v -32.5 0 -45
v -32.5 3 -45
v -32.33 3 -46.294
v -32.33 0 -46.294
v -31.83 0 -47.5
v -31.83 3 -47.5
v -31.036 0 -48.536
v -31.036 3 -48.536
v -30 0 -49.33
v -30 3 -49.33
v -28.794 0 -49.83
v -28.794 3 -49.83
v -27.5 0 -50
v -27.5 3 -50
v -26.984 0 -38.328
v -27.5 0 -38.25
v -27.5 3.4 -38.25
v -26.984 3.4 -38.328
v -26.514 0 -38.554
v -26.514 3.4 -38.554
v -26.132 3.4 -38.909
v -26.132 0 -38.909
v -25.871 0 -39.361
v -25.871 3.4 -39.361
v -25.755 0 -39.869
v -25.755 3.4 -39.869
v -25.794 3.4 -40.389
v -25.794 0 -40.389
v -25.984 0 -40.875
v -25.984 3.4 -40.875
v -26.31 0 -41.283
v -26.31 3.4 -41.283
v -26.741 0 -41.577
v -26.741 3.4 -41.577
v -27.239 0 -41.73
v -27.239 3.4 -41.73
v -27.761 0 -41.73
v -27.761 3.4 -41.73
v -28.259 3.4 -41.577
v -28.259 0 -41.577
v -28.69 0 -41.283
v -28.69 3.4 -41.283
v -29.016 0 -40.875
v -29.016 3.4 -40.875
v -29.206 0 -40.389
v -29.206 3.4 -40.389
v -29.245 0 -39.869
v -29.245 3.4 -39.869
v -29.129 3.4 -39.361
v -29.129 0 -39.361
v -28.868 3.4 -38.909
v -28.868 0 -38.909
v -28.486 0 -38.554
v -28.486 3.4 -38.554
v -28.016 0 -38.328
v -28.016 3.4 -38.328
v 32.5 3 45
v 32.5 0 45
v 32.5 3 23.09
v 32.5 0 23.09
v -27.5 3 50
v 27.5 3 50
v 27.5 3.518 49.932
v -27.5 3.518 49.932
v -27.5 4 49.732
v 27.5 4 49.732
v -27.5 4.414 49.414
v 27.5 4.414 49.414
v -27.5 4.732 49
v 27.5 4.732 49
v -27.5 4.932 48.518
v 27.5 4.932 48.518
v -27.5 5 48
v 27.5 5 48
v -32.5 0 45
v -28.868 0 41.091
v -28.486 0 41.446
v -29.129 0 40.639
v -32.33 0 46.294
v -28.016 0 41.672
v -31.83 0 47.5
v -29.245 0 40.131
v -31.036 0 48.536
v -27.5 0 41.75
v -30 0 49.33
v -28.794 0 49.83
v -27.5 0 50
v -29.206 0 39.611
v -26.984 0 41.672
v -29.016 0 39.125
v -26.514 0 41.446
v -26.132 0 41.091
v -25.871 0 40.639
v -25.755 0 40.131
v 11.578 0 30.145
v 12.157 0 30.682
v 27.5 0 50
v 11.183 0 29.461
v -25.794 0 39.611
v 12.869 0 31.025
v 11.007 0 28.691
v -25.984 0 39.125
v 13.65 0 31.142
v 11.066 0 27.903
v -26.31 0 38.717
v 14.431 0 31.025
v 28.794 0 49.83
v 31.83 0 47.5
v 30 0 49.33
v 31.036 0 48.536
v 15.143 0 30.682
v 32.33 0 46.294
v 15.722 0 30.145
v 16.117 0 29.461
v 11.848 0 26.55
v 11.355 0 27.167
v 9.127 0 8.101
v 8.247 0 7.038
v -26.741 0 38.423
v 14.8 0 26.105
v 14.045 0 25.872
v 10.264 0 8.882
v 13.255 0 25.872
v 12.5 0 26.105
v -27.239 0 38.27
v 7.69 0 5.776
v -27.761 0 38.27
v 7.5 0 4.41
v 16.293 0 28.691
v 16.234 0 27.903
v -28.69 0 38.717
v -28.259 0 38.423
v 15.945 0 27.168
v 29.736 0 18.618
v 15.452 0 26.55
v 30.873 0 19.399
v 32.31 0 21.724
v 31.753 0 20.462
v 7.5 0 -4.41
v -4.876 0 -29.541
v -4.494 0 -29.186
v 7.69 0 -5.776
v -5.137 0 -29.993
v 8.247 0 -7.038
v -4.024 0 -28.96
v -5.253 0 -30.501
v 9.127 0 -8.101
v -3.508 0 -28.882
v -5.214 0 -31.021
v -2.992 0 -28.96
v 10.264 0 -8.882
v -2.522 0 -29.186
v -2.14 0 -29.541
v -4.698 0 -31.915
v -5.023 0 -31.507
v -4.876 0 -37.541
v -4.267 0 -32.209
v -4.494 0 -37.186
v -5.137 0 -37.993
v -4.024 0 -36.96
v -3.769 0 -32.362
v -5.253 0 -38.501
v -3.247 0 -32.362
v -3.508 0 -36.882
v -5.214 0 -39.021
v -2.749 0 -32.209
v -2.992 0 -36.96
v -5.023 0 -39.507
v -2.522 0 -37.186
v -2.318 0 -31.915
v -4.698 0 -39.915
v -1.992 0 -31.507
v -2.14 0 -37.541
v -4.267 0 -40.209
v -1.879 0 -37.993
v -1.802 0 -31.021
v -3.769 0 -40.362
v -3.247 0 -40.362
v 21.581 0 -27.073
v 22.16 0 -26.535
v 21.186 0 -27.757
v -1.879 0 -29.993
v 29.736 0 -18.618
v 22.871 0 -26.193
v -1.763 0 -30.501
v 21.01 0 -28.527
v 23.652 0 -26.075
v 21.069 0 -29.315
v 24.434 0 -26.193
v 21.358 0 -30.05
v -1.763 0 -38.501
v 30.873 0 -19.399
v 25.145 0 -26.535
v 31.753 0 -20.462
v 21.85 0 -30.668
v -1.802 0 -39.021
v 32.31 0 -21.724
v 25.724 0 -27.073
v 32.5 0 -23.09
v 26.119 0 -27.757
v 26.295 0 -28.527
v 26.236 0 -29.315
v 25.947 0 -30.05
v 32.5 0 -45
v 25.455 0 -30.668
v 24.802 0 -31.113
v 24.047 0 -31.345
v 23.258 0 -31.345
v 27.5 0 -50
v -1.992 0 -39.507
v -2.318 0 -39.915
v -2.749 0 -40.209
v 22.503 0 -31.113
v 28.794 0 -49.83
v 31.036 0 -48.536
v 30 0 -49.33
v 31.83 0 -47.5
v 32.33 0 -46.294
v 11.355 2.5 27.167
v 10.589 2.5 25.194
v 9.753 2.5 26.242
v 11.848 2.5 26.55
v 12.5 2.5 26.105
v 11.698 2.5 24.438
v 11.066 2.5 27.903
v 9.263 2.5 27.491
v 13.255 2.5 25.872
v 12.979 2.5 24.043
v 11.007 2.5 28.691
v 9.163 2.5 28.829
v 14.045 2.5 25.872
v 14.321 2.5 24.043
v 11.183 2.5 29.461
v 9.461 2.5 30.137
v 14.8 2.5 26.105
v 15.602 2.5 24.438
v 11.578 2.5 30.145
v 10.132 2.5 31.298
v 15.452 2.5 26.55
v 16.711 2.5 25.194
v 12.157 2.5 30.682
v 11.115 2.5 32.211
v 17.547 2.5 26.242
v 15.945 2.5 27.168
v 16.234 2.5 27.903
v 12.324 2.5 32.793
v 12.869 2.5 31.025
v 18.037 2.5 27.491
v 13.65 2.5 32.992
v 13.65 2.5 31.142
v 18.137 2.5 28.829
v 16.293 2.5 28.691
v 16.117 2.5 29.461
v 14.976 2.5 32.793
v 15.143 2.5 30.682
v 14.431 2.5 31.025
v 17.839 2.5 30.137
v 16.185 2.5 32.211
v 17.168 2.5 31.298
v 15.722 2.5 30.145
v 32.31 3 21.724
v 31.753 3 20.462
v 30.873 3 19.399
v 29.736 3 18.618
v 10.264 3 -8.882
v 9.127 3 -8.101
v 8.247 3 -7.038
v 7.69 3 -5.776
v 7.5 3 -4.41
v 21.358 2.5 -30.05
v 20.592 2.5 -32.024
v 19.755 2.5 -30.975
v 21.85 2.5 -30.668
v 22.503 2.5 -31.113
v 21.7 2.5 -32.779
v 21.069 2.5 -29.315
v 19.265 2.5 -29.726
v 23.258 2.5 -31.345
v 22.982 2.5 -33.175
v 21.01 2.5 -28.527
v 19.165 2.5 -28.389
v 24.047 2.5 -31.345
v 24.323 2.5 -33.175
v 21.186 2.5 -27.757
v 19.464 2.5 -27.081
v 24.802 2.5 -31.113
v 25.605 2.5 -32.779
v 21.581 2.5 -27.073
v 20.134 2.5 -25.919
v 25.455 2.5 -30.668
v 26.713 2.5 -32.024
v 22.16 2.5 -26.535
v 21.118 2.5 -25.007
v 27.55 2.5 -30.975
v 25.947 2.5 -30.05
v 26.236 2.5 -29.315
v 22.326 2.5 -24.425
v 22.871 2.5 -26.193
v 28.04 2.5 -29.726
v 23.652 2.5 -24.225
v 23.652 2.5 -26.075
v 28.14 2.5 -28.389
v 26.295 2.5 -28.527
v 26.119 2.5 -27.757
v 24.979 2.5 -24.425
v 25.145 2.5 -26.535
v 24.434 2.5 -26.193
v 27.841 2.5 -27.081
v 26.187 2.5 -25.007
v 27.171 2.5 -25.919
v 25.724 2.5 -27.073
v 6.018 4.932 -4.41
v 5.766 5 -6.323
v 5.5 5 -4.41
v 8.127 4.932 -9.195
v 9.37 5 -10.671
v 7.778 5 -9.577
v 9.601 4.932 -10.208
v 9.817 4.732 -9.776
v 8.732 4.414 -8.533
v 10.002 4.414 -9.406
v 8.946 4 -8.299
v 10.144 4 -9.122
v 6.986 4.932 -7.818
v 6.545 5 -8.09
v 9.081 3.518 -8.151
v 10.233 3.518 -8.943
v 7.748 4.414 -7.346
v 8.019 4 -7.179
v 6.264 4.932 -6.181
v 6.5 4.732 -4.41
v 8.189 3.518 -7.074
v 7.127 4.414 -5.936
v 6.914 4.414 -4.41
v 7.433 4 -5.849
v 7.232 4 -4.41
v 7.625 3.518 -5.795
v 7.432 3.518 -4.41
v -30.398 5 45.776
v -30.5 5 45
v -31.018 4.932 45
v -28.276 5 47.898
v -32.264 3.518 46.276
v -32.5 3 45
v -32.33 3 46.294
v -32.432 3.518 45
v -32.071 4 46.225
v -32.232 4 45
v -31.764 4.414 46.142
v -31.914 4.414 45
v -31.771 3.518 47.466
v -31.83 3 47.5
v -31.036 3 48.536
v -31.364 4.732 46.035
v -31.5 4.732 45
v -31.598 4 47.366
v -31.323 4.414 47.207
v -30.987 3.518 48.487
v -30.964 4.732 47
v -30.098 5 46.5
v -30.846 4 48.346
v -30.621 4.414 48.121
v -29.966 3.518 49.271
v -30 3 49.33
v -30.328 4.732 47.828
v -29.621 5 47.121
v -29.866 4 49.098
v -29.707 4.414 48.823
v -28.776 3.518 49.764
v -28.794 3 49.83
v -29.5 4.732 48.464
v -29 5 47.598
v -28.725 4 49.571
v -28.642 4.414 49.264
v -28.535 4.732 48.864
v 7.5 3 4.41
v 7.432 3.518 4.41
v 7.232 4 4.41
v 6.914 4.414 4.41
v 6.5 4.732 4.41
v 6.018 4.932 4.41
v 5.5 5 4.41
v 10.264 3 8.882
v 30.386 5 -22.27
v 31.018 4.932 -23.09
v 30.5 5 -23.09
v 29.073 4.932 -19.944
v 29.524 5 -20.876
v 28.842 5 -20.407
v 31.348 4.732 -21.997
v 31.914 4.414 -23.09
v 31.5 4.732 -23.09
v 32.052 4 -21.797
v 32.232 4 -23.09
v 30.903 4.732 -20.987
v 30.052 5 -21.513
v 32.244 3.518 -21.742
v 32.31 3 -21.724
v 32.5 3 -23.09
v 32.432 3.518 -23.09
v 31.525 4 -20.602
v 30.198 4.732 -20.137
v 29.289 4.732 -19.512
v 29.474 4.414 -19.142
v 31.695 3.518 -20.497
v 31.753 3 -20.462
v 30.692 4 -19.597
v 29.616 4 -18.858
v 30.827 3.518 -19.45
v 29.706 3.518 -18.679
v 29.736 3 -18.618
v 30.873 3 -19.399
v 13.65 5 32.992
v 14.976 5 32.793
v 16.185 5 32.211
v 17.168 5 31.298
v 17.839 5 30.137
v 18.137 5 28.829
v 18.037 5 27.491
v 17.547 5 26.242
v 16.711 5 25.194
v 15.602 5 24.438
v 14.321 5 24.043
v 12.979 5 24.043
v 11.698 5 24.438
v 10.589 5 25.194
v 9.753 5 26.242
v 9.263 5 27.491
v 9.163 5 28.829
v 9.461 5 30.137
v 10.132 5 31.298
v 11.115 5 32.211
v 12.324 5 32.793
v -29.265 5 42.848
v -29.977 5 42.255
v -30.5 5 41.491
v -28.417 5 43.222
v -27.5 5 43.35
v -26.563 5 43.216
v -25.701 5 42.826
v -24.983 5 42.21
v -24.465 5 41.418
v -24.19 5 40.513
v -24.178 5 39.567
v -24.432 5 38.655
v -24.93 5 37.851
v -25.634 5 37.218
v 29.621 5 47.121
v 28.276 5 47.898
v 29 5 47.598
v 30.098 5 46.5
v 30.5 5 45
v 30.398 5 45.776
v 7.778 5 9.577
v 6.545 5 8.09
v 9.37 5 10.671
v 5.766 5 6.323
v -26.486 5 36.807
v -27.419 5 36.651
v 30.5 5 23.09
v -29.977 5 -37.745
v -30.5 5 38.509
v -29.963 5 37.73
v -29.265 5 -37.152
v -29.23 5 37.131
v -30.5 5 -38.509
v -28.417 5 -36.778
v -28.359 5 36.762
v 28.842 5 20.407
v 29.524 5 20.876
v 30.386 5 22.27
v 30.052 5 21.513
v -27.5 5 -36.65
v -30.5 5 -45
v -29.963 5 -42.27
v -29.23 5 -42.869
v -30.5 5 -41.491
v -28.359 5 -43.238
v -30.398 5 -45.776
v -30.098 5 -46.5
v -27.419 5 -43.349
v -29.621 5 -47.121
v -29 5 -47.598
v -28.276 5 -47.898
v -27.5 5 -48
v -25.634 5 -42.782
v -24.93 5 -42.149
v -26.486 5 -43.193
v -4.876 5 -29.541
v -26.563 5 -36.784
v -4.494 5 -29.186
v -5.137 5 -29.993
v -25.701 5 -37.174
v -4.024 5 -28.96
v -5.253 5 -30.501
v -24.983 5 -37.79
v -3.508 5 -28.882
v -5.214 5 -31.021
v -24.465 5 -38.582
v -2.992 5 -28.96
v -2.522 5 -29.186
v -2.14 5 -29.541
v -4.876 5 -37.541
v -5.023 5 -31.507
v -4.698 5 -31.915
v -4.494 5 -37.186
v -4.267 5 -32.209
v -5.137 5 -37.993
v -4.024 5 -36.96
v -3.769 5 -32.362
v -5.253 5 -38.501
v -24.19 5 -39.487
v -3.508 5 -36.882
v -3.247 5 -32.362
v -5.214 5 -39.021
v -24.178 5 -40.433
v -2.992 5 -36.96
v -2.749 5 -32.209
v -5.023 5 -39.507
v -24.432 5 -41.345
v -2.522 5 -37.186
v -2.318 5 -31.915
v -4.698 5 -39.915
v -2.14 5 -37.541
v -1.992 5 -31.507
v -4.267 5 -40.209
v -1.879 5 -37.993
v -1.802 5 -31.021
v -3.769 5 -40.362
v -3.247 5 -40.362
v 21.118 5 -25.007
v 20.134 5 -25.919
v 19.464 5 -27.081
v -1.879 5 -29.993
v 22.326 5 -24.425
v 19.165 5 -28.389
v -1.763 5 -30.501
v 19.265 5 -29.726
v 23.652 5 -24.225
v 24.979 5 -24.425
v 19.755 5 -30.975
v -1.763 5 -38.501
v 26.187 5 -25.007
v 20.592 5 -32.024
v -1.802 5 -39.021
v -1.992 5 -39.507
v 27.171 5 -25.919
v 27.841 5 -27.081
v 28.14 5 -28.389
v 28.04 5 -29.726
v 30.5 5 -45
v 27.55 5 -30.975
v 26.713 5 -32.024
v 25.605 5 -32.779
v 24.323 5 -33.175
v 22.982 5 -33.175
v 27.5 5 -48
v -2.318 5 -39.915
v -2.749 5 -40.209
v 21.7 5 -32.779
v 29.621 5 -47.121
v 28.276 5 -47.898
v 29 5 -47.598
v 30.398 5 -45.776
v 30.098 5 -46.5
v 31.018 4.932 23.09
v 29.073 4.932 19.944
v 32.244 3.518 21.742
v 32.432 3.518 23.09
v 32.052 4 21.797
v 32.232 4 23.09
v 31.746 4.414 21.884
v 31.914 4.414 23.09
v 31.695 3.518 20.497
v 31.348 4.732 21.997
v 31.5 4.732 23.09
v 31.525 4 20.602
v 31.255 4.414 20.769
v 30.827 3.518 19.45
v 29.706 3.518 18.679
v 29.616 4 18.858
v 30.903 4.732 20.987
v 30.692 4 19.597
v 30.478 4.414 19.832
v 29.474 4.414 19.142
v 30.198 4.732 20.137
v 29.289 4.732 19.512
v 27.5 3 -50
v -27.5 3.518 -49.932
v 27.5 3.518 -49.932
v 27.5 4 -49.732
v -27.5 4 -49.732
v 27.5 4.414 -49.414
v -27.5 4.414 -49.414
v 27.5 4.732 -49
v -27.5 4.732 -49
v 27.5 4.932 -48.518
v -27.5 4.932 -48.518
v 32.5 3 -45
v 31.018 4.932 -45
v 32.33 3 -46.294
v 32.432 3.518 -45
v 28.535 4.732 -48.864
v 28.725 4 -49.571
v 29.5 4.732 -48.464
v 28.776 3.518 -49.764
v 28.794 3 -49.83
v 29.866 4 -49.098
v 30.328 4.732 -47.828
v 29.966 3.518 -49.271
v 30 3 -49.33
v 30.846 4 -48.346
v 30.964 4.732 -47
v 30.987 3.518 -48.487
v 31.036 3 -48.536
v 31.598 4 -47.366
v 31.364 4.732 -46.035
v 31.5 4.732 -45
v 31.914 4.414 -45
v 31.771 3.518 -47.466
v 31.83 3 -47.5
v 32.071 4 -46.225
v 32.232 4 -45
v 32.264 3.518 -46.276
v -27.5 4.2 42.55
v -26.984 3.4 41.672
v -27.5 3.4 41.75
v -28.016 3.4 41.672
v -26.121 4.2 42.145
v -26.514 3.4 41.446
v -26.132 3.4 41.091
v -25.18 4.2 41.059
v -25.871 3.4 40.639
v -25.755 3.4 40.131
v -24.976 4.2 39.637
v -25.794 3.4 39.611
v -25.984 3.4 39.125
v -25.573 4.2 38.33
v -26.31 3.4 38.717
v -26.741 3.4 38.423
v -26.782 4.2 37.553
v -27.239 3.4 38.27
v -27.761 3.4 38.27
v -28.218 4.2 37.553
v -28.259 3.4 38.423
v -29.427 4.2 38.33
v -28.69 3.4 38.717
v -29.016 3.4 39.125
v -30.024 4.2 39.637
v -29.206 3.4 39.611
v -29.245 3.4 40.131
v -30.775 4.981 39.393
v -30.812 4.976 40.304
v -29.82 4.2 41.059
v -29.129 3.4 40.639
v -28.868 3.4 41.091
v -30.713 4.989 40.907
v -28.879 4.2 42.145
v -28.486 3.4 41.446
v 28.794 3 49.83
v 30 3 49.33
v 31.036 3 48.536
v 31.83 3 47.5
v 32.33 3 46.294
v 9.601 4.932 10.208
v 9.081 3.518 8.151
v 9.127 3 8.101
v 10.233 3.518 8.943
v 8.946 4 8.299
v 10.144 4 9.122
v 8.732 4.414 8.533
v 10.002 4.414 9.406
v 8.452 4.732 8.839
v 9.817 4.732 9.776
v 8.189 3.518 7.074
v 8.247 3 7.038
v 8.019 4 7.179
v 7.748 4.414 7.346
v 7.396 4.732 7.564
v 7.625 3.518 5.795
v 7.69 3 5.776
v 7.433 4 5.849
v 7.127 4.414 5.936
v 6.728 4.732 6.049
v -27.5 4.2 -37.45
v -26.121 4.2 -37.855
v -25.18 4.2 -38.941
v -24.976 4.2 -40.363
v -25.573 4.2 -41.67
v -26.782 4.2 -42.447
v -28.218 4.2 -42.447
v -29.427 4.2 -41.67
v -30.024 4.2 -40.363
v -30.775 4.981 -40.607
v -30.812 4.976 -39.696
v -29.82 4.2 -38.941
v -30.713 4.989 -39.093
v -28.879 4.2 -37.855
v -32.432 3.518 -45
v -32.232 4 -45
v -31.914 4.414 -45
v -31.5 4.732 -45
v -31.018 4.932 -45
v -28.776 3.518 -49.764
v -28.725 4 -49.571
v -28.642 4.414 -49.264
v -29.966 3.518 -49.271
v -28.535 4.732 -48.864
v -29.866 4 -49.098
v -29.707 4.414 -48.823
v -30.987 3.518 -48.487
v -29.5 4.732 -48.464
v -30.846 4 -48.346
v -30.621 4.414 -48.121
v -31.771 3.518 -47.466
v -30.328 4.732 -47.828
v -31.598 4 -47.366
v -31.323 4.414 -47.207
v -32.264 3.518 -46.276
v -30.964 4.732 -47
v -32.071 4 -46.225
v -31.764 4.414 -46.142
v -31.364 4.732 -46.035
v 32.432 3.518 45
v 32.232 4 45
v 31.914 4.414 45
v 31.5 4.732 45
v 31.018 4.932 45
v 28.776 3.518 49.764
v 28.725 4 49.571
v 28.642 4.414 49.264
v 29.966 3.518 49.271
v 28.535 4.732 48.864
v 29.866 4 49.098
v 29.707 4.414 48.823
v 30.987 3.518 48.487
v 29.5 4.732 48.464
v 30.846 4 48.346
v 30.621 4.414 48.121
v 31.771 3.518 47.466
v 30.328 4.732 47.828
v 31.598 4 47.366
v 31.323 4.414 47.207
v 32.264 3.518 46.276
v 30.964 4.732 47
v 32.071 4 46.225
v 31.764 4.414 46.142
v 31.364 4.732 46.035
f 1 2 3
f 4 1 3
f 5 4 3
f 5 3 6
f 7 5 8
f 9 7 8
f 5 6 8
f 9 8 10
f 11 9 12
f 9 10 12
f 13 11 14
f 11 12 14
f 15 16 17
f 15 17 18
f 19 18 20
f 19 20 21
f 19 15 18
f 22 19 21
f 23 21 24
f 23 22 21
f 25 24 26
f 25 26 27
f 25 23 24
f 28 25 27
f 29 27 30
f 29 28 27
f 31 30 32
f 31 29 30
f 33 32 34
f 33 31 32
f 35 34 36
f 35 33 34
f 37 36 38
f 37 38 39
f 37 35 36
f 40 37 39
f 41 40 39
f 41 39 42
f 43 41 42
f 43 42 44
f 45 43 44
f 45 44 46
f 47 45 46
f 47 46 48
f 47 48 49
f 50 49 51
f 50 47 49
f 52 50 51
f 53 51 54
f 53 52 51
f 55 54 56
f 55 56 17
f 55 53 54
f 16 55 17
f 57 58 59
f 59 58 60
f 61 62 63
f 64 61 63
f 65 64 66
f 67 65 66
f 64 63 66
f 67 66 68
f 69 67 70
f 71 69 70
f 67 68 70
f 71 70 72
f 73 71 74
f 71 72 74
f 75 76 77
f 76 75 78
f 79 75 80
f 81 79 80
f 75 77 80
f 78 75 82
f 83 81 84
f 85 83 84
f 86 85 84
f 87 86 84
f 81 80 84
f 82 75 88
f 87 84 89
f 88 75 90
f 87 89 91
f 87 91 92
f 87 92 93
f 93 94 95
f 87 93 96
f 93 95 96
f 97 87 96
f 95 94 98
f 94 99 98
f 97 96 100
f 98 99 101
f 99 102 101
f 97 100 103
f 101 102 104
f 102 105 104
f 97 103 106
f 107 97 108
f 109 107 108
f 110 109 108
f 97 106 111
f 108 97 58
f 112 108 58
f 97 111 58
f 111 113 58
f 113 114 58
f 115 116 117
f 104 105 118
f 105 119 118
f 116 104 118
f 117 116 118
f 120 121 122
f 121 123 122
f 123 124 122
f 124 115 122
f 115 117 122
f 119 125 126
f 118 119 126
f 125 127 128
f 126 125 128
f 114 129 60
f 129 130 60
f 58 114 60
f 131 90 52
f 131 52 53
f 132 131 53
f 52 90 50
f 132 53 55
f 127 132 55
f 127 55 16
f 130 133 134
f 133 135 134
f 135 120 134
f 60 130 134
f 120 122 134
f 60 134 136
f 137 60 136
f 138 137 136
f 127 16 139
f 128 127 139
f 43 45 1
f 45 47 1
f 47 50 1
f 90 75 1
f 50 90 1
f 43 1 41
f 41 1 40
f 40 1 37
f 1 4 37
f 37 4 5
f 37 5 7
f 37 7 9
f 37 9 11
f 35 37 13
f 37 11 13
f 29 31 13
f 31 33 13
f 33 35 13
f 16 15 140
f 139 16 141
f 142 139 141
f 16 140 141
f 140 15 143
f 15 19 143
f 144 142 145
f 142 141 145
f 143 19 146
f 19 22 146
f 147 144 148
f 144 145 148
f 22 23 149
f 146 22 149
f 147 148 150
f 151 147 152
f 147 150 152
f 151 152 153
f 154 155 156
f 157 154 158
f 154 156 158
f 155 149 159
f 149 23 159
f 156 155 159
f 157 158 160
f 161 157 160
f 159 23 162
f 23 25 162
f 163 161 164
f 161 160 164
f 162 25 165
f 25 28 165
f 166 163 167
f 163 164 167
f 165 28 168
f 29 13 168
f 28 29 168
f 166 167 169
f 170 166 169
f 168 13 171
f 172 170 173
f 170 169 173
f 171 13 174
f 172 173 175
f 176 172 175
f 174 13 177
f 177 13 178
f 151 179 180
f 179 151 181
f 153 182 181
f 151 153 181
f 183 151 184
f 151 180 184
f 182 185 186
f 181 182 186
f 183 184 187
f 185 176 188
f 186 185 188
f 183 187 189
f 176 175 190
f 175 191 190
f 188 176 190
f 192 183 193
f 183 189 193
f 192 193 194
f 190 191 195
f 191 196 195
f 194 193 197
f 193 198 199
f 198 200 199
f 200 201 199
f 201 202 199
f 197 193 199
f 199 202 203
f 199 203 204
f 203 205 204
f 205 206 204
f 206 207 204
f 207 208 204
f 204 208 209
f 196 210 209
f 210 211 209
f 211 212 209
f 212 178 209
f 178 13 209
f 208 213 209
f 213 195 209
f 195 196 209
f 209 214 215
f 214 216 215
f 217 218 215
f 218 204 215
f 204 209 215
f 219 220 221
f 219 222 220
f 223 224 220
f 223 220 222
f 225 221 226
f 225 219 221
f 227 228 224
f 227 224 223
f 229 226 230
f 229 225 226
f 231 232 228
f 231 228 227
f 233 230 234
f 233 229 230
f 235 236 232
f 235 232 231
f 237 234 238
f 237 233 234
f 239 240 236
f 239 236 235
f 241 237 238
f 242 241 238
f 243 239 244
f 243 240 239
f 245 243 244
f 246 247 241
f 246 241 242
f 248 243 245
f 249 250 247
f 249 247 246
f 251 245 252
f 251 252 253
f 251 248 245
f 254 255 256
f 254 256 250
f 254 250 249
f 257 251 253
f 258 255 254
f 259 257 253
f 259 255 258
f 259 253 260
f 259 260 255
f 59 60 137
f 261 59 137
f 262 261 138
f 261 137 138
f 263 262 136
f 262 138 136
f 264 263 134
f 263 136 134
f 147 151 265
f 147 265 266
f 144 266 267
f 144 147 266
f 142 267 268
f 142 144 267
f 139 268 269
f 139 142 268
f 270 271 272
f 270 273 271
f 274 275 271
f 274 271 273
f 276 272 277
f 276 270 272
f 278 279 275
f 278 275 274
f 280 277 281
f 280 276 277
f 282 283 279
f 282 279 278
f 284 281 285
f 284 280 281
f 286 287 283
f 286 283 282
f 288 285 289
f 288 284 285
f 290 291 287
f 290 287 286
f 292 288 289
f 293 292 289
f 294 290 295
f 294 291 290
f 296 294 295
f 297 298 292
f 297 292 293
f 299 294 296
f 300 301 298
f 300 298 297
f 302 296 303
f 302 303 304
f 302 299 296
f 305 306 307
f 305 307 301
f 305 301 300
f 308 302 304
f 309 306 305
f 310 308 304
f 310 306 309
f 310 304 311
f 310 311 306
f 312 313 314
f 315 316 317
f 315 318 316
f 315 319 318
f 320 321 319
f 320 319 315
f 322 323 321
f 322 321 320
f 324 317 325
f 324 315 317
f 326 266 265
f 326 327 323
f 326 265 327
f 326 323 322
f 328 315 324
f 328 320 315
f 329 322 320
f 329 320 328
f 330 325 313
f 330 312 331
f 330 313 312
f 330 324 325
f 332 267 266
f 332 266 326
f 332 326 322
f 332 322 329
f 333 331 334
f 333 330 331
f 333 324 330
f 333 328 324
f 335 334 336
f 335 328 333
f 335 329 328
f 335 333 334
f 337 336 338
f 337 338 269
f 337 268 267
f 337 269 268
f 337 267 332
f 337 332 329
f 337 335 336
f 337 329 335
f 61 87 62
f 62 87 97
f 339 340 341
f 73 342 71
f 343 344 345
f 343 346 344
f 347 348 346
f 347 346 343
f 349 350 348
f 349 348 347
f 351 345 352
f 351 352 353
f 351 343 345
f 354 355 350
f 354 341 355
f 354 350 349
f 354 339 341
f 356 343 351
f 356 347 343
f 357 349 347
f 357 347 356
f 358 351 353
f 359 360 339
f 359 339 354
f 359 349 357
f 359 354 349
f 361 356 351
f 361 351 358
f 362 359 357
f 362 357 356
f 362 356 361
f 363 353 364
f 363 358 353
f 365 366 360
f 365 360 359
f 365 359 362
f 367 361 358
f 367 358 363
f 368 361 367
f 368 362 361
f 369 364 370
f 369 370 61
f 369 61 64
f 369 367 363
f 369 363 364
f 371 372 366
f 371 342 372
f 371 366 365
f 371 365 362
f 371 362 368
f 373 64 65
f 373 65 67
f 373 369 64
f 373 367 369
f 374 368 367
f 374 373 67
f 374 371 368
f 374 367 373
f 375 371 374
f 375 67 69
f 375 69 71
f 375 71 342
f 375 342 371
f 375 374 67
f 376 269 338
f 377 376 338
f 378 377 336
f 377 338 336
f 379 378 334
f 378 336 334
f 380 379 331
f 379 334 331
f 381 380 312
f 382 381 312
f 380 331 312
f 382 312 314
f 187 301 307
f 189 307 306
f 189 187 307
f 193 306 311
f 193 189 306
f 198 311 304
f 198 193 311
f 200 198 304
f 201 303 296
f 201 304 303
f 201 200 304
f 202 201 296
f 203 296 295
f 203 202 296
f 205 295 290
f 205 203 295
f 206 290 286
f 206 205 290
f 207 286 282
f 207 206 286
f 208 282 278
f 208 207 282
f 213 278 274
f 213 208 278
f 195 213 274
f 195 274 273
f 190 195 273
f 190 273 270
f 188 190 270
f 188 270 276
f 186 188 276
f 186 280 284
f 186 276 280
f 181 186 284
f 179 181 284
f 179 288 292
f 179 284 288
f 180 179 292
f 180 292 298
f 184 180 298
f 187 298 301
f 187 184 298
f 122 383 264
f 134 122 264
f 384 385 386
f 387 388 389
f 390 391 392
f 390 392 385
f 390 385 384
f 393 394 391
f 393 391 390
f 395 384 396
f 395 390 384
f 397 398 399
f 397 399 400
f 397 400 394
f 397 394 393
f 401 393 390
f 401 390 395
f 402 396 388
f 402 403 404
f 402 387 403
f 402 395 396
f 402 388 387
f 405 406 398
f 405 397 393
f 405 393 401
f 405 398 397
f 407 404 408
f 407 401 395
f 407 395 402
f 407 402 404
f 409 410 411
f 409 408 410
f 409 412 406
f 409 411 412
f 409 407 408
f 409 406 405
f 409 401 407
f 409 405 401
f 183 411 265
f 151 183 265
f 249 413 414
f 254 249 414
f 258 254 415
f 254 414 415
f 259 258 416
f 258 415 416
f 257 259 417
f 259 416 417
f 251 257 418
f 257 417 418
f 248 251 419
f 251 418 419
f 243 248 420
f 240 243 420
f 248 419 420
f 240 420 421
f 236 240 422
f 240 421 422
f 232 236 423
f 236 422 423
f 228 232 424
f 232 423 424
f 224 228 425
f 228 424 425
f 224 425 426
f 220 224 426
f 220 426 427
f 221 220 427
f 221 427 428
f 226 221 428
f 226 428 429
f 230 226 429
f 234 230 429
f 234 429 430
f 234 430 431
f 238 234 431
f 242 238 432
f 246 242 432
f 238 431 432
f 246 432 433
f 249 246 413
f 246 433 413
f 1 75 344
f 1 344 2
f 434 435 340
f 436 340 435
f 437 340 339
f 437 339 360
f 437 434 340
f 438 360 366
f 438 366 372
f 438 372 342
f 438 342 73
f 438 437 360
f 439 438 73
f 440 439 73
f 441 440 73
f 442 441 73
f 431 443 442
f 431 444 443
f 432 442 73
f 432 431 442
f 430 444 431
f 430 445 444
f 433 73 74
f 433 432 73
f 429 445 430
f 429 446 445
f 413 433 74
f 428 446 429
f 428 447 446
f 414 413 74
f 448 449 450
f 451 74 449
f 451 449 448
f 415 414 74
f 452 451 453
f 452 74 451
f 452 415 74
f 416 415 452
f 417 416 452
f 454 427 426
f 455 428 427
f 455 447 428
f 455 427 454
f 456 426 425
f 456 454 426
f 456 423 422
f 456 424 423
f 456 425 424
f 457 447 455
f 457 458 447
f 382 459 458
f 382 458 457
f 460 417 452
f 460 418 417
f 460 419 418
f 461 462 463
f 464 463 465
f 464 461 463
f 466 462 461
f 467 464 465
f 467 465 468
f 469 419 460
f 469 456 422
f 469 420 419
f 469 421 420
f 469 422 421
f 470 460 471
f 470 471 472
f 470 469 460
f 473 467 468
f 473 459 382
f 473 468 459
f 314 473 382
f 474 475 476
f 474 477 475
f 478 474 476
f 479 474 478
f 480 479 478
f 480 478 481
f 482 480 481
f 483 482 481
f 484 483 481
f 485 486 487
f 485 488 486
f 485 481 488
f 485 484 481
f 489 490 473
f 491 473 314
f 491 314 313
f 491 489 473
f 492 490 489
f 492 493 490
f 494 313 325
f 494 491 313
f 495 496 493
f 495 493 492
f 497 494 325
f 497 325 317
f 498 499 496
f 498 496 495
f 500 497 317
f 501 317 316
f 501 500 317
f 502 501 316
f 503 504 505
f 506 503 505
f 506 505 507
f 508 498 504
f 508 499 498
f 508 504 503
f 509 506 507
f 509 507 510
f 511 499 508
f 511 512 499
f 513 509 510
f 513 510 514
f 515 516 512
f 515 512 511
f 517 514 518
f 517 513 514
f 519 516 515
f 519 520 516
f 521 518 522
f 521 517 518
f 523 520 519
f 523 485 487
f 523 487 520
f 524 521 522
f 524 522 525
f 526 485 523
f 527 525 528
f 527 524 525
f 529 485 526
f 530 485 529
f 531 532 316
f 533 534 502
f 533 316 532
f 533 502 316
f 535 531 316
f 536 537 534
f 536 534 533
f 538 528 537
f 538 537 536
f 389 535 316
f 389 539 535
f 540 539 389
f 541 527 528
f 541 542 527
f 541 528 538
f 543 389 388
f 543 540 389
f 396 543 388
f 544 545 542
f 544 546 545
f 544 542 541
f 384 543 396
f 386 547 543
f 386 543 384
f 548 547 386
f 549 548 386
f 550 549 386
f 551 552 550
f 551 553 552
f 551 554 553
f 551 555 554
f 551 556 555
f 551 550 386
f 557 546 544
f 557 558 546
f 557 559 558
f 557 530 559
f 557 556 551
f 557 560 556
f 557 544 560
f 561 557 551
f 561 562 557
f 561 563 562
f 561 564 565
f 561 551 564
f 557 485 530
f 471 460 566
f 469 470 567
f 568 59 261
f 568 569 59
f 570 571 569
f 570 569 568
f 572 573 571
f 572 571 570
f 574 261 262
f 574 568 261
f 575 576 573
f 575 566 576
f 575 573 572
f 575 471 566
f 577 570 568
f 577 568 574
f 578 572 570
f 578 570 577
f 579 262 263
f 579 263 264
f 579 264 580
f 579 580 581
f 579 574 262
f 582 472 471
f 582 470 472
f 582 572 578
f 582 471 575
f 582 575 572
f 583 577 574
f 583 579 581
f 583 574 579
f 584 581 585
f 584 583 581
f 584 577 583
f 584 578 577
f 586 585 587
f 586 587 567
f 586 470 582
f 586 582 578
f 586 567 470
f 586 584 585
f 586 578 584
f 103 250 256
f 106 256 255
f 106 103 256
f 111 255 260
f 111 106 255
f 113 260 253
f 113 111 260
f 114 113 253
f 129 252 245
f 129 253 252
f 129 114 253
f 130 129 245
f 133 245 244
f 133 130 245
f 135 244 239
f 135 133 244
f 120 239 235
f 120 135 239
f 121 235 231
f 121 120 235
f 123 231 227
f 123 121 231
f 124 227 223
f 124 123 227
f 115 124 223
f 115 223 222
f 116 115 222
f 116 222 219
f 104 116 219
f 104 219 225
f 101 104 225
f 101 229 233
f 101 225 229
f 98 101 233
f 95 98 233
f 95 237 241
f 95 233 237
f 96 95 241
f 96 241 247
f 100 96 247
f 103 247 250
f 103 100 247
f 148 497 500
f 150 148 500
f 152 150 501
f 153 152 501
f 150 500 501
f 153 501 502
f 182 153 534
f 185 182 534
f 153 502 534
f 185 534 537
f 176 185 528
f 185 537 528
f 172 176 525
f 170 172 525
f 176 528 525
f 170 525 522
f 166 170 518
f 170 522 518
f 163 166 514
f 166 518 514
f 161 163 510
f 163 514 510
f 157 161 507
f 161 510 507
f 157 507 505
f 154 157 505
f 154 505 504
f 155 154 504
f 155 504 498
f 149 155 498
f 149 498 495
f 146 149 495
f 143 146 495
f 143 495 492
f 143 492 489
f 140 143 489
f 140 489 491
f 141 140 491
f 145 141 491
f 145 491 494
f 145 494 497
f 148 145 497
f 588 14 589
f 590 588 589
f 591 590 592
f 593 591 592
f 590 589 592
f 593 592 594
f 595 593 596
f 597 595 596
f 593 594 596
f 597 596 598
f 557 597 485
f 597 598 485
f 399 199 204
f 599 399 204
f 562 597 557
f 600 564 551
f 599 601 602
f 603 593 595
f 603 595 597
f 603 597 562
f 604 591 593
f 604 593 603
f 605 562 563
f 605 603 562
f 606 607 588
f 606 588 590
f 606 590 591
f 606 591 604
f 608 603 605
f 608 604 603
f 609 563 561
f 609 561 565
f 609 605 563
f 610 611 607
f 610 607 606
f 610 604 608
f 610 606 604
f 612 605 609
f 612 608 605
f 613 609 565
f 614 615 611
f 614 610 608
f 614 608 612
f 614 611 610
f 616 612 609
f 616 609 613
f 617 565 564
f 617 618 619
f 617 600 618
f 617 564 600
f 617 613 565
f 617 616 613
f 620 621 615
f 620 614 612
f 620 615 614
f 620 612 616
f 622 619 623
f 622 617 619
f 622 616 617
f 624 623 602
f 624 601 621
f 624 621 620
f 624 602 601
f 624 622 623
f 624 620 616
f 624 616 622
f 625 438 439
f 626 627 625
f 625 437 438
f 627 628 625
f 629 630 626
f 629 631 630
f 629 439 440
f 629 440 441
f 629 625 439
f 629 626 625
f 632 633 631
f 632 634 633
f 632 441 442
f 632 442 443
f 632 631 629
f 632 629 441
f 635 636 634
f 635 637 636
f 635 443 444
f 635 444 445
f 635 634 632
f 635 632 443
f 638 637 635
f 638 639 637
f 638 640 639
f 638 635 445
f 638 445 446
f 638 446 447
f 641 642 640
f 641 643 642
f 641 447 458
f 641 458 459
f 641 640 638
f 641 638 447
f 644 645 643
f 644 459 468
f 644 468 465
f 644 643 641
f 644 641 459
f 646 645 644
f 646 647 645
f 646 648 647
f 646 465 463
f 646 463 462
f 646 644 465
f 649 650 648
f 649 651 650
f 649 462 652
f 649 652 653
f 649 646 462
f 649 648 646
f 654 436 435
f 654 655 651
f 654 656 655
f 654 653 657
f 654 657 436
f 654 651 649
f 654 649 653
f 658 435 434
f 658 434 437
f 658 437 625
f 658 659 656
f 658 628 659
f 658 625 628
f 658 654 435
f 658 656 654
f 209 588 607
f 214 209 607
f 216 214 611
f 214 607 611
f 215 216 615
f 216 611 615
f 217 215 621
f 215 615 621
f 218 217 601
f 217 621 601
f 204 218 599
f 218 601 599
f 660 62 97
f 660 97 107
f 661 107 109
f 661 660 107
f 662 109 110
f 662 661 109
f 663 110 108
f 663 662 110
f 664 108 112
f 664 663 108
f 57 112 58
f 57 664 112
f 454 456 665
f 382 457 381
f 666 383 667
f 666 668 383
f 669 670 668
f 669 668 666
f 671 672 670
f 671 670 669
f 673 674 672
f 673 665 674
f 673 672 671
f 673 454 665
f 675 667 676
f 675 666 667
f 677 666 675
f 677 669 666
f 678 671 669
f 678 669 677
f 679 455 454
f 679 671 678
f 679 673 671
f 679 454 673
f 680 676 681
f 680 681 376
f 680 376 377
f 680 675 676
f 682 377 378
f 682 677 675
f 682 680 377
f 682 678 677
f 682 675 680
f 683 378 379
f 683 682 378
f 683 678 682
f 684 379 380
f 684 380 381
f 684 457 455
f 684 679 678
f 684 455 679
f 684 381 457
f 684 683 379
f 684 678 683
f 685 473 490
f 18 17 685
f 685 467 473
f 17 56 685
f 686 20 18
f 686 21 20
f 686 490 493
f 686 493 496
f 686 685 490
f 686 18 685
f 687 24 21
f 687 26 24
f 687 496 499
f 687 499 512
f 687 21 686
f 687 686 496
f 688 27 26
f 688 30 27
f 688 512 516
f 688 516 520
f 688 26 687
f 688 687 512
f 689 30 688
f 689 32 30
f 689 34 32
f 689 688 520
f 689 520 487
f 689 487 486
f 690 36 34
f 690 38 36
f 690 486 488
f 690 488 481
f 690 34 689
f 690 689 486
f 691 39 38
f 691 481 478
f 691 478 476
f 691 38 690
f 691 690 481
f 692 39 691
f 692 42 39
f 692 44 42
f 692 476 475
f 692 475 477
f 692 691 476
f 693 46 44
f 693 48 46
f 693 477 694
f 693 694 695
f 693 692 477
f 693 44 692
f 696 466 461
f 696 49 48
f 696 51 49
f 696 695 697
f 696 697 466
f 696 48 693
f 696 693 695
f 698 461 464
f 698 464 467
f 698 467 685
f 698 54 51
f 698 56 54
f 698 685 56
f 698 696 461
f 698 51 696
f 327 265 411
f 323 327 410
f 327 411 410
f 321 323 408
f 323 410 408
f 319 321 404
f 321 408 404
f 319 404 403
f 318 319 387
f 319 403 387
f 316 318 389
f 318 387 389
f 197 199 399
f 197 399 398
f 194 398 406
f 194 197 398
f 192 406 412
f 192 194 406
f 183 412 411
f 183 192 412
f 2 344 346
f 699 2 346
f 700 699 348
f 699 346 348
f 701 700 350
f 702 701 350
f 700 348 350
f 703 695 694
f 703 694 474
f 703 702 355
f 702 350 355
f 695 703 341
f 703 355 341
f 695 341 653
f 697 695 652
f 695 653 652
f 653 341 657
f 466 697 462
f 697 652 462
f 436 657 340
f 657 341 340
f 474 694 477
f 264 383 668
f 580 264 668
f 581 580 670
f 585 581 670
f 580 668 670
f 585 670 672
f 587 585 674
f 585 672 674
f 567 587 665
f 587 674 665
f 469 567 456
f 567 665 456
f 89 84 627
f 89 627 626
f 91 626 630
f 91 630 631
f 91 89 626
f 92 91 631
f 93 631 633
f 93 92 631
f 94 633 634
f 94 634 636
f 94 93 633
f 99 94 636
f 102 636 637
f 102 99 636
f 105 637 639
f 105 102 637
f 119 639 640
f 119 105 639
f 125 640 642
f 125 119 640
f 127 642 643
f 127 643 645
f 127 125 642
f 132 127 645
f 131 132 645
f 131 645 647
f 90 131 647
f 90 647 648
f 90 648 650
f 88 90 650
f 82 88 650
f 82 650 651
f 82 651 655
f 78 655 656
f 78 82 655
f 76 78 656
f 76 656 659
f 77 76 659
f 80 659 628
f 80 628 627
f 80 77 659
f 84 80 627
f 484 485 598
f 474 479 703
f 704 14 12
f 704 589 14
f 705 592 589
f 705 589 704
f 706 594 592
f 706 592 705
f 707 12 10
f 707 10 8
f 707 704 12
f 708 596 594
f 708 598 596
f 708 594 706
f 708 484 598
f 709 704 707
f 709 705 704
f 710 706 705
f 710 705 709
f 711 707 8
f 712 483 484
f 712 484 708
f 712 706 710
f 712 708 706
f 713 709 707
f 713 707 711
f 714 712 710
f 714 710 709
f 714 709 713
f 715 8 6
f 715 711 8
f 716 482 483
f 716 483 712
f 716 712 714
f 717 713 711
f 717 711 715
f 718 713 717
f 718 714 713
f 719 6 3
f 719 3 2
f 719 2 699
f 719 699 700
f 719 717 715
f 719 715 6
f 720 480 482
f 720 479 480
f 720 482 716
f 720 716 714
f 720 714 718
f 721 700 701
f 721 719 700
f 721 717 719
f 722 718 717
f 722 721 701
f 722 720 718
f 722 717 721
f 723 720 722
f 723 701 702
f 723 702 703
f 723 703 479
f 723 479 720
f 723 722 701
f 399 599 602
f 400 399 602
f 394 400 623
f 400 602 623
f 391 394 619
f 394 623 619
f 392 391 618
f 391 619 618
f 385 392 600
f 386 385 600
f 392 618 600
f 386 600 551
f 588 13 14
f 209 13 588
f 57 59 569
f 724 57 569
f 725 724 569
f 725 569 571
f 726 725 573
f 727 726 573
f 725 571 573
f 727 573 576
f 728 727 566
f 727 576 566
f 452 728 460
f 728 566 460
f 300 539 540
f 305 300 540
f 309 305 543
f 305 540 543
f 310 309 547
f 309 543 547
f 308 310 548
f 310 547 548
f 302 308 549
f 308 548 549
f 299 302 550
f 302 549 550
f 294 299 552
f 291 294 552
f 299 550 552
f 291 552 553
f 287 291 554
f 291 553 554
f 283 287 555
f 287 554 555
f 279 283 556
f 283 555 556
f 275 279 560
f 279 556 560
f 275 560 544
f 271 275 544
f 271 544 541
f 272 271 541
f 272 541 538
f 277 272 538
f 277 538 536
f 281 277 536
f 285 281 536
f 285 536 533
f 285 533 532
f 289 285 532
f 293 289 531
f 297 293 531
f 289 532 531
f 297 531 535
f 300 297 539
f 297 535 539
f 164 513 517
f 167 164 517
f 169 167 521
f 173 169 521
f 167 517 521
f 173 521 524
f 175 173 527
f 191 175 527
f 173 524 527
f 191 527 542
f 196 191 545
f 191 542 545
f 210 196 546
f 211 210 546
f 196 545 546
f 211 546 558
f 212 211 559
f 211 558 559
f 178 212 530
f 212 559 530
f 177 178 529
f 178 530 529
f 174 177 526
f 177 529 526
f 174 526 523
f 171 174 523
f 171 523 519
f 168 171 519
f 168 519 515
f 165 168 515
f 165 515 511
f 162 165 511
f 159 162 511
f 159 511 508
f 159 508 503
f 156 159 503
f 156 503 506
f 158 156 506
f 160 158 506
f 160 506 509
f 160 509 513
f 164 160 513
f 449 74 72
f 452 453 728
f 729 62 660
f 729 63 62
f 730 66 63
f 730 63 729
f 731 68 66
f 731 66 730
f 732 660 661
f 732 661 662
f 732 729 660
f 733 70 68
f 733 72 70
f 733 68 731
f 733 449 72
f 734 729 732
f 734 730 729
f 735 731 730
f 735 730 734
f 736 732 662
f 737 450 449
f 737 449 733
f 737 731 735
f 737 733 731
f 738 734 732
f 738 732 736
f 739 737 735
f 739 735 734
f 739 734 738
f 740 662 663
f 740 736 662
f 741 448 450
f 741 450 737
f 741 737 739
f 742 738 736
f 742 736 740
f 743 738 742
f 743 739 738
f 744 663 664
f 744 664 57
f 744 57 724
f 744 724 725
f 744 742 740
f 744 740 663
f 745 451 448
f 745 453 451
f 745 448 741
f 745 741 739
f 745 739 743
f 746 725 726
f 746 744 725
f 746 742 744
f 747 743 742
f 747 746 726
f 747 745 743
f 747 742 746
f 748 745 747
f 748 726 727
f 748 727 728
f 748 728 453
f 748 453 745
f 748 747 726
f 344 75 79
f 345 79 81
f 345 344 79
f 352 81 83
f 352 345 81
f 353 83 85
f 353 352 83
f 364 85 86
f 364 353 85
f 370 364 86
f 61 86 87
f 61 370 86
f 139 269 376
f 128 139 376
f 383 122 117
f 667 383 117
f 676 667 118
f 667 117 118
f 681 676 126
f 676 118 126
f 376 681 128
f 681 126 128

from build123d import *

# Parameters (mm, degrees)
SKETCH2_W           = 65
SKETCH2_H           = 100
SKETCH2_R           = 1.75
SKETCH2_R_2         = 2.65
BOSS_EXTRUDE1_DEPTH = 5
SKETCH3_R           = 4.5
CUT_EXTRUDE1_DEPTH  = 2.5
CUT_EXTRUDE2_DEPTH  = 60.843546018
FILLET1_R           = 5
CHAMFER1_SIZE       = 1.6
FILLET3_R           = 5
FILLET2_R           = 2
SKETCH5_R           = 1.75
CUT_EXTRUDE3_DEPTH  = 60.843546072


with BuildPart() as part:
    # Sketch2 → Boss-Extrude1 (new body)
    with BuildSketch(Plane(origin=(0, 0, 0), x_dir=(1, 0, 0), z_dir=(0, 1, 0))):
        Rectangle(SKETCH2_W, SKETCH2_H)
        with Locations(Location((-27.5, 40, 0), (0, 0, 270))):
            Circle(SKETCH2_R, mode=Mode.SUBTRACT)
        with Locations(Location((-27.5, -40, 0), (0, 0, 270))):
            Circle(SKETCH2_R, mode=Mode.SUBTRACT)
        with Locations(Location((23.6525, 28.725, 0), (0, 0, 270))):
            Circle(SKETCH2_R_2, mode=Mode.SUBTRACT)
        with Locations(Location((13.65, -28.4925, 0), (0, 0, 270))):
            Circle(SKETCH2_R_2, mode=Mode.SUBTRACT)
    extrude(amount=BOSS_EXTRUDE1_DEPTH)

    # Sketch3 → Cut-Extrude1 (cut)
    with BuildSketch(Plane(origin=(0, 5, 0), x_dir=(1, 0, 0), z_dir=(0, 1, 0))):
        with Locations(Location((23.6525, 28.725, 0), (0, 0, 270))):
            Circle(SKETCH3_R)
        with Locations(Location((13.65, -28.4925, 0), (0, 0, 270))):
            Circle(SKETCH3_R)
    extrude(amount=-CUT_EXTRUDE1_DEPTH, mode=Mode.SUBTRACT)

    # Sketch4 → Cut-Extrude2 (cut, through all)
    with BuildSketch(Plane(origin=(0, 5, 0), x_dir=(1, 0, 0), z_dir=(0, 1, 0))):
        Polygon((7.5, 7.5), (7.5, -7.5), (32.5, -20), (32.5, 20), align=None)
    extrude(amount=-CUT_EXTRUDE2_DEPTH, mode=Mode.SUBTRACT)

    # Fillet1
    fillet1_edges = [part.edges().sort_by_distance(p)[0] for p in [
        (32.5, 2.5, 50),
        (-32.5, 2.5, 50),
        (-32.5, 2.5, -50),
        (32.5, 2.5, -50),
    ]]
    fillet(fillet1_edges, radius=FILLET1_R)

    # Chamfer1
    chamfer1_edges = [part.edges().sort_by_distance(p)[0] for p in [
        (-27.5, 5, -41.75),
        (-27.5, 5, 38.25),
    ]]
    chamfer(chamfer1_edges, length=CHAMFER1_SIZE)

    # Fillet3
    fillet3_edges = [part.edges().sort_by_distance(p)[0] for p in [
        (7.5, 2.5, -7.5),
        (32.5, 2.5, -20),
        (32.5, 2.5, 20),
        (7.5, 2.5, 7.5),
    ]]
    fillet(fillet3_edges, radius=FILLET3_R)

    # Fillet2
    # the kernel refuses this fillet: 2 mm, written as the material it takes off along each edge
    with BuildSketch(Plane(origin=(12.5, 5, 4.409830056), x_dir=(-0.447213595499958, 0, 0.894427190999916), z_dir=(0.894427190999916, 0, 0.447213595499958))) as fillet2_piece_1:
        with BuildLine():
            CenterArc((5 + FILLET2_R, FILLET2_R), FILLET2_R, 180, 90)
            Line((5, FILLET2_R), (5, 0))
            Line((5, 0), (5 + FILLET2_R, 0))
        make_face()
    revolve(axis=Axis((12.5, 5, 4.409830056), (0, -1, 0)), revolution_arc=63.434948823, mode=Mode.SUBTRACT)
    with BuildSketch(Plane(origin=(12.5, 5, -4.409830056), x_dir=(-0.447213595499958, 0, -0.894427190999916), z_dir=(0.894427190999916, 0, -0.447213595499958))) as fillet2_piece_2:
        with BuildLine():
            CenterArc((5 + FILLET2_R, -FILLET2_R), FILLET2_R, 90, 90)
            Line((5, -FILLET2_R), (5, 0))
            Line((5, 0), (5 + FILLET2_R, 0))
        make_face()
    revolve(axis=Axis((12.5, 5, -4.409830056), (0, 1, 0)), revolution_arc=63.434948823, mode=Mode.SUBTRACT)
    with BuildSketch(Plane(origin=(32.5, 5, 23.090169944), x_dir=(-1, 0, 0), z_dir=(0, 0, 1)), Plane(origin=(32.5, 5, -45), x_dir=(-1, 0, 0), z_dir=(0, 0, 1))) as fillet2_piece_3:
        with BuildLine():
            CenterArc((FILLET2_R, FILLET2_R), FILLET2_R, 180, 90)
            Line((0, FILLET2_R), (0, 0))
            Line((0, 0), (FILLET2_R, 0))
        make_face()
    extrude(amount=21.909830056, mode=Mode.SUBTRACT)
    with BuildSketch(Plane(origin=(27.5, 5, 50), x_dir=(0, 0, -1), z_dir=(-1, 0, 0)), Plane(origin=(-27.5, 5, -50), x_dir=(0, 0, 1), z_dir=(1, 0, 0))) as fillet2_piece_4:
        with BuildLine():
            CenterArc((FILLET2_R, FILLET2_R), FILLET2_R, 180, 90)
            Line((0, FILLET2_R), (0, 0))
            Line((0, 0), (FILLET2_R, 0))
        make_face()
    extrude(amount=55, mode=Mode.SUBTRACT)
    with BuildSketch(Plane(origin=(-32.5, 5, 45), x_dir=(1, 0, 0), z_dir=(0, 0, -1))) as fillet2_piece_5:
        with BuildLine():
            CenterArc((FILLET2_R, FILLET2_R), FILLET2_R, 180, 90)
            Line((0, FILLET2_R), (0, 0))
            Line((0, 0), (FILLET2_R, 0))
        make_face()
    extrude(amount=90, mode=Mode.SUBTRACT)
    with BuildSketch(Plane(origin=(-27.5, 5, 45), x_dir=(-1, 0, 0), z_dir=(0, 0, -1))) as fillet2_piece_6:
        with BuildLine():
            CenterArc((5 - FILLET2_R, -FILLET2_R), FILLET2_R, 0, 90)
            Line((5, -FILLET2_R), (5, 0))
            Line((5, 0), (5 - FILLET2_R, 0))
        make_face()
    revolve(axis=Axis((-27.5, 5, 45), (0, 1, 0)), revolution_arc=90, mode=Mode.SUBTRACT)
    with BuildSketch(Plane(origin=(27.5, 5, -45), x_dir=(0, 0, -1), z_dir=(-1, 0, 0))) as fillet2_piece_7:
        with BuildLine():
            CenterArc((5 - FILLET2_R, FILLET2_R), FILLET2_R, 270, 90)
            Line((5, FILLET2_R), (5, 0))
            Line((5, 0), (5 - FILLET2_R, 0))
        make_face()
    revolve(axis=Axis((27.5, 5, -45), (0, -1, 0)), revolution_arc=90, mode=Mode.SUBTRACT)
    with BuildSketch(Plane(origin=(-27.5, 5, -45), x_dir=(0, 0, -1), z_dir=(1, 0, 0))) as fillet2_piece_8:
        with BuildLine():
            CenterArc((5 - FILLET2_R, -FILLET2_R), FILLET2_R, 0, 90)
            Line((5, -FILLET2_R), (5, 0))
            Line((5, 0), (5 - FILLET2_R, 0))
        make_face()
    revolve(axis=Axis((-27.5, 5, -45), (0, 1, 0)), revolution_arc=90, mode=Mode.SUBTRACT)
    with BuildSketch(Plane(origin=(27.5, 5, 45), x_dir=(0, 0, 1), z_dir=(-1, 0, 0))) as fillet2_piece_9:
        with BuildLine():
            CenterArc((5 - FILLET2_R, -FILLET2_R), FILLET2_R, 0, 90)
            Line((5, -FILLET2_R), (5, 0))
            Line((5, 0), (5 - FILLET2_R, 0))
        make_face()
    revolve(axis=Axis((27.5, 5, 45), (0, 1, 0)), revolution_arc=90, mode=Mode.SUBTRACT)
    with BuildSketch(Plane(origin=(29.736067977, 5, -18.618033989), x_dir=(-0.4472135954999579, 0, -0.8944271909999159), z_dir=(-0.894427190999916, 0, 0.4472135954999579)), Plane(origin=(10.263932023, 5, 8.881966011), x_dir=(-0.4472135954999579, 0, 0.894427190999916), z_dir=(0.894427190999916, 0, 0.4472135954999579))) as fillet2_piece_10:
        with BuildLine():
            CenterArc((FILLET2_R, FILLET2_R), FILLET2_R, 180, 90)
            Line((0, FILLET2_R), (0, 0))
            Line((0, 0), (FILLET2_R, 0))
        make_face()
    extrude(amount=21.770509831, mode=Mode.SUBTRACT)
    with BuildSketch(Plane(origin=(7.5, 5, -4.409830056), x_dir=(-1, 0, 0), z_dir=(0, 0, 1))) as fillet2_piece_11:
        with BuildLine():
            CenterArc((FILLET2_R, FILLET2_R), FILLET2_R, 180, 90)
            Line((0, FILLET2_R), (0, 0))
            Line((0, 0), (FILLET2_R, 0))
        make_face()
    extrude(amount=8.819660113, mode=Mode.SUBTRACT)
    with BuildSketch(Plane(origin=(27.5, 5, 23.090169944), x_dir=(1, 0, 0), z_dir=(0, 0, 1))) as fillet2_piece_12:
        with BuildLine():
            CenterArc((5 - FILLET2_R, -FILLET2_R), FILLET2_R, 0, 90)
            Line((5, -FILLET2_R), (5, 0))
            Line((5, 0), (5 - FILLET2_R, 0))
        make_face()
    revolve(axis=Axis((27.5, 5, 23.090169944), (0, 1, 0)), revolution_arc=63.434948823, mode=Mode.SUBTRACT)
    with BuildSketch(Plane(origin=(27.5, 5, -23.090169944), x_dir=(1, 0, 0), z_dir=(0, 0, -1))) as fillet2_piece_13:
        with BuildLine():
            CenterArc((5 - FILLET2_R, FILLET2_R), FILLET2_R, 270, 90)
            Line((5, FILLET2_R), (5, 0))
            Line((5, 0), (5 - FILLET2_R, 0))
        make_face()
    revolve(axis=Axis((27.5, 5, -23.090169944), (0, -1, 0)), revolution_arc=63.434948823, mode=Mode.SUBTRACT)

    # Sketch5 → Cut-Extrude3 (cut, through all)
    with BuildSketch(Plane(origin=(0, 5, 0), x_dir=(1, 0, 0), z_dir=(0, 1, 0))):
        with Locations(Location((-3.507863002, 38.632025627, 0), (0, 0, 270))):
            Circle(SKETCH5_R)
        with Locations(Location((-3.507863002, 30.632025627, 0), (0, 0, 270))):
            Circle(SKETCH5_R)
    extrude(amount=-CUT_EXTRUDE3_DEPTH, mode=Mode.SUBTRACT)


solid = part.part
